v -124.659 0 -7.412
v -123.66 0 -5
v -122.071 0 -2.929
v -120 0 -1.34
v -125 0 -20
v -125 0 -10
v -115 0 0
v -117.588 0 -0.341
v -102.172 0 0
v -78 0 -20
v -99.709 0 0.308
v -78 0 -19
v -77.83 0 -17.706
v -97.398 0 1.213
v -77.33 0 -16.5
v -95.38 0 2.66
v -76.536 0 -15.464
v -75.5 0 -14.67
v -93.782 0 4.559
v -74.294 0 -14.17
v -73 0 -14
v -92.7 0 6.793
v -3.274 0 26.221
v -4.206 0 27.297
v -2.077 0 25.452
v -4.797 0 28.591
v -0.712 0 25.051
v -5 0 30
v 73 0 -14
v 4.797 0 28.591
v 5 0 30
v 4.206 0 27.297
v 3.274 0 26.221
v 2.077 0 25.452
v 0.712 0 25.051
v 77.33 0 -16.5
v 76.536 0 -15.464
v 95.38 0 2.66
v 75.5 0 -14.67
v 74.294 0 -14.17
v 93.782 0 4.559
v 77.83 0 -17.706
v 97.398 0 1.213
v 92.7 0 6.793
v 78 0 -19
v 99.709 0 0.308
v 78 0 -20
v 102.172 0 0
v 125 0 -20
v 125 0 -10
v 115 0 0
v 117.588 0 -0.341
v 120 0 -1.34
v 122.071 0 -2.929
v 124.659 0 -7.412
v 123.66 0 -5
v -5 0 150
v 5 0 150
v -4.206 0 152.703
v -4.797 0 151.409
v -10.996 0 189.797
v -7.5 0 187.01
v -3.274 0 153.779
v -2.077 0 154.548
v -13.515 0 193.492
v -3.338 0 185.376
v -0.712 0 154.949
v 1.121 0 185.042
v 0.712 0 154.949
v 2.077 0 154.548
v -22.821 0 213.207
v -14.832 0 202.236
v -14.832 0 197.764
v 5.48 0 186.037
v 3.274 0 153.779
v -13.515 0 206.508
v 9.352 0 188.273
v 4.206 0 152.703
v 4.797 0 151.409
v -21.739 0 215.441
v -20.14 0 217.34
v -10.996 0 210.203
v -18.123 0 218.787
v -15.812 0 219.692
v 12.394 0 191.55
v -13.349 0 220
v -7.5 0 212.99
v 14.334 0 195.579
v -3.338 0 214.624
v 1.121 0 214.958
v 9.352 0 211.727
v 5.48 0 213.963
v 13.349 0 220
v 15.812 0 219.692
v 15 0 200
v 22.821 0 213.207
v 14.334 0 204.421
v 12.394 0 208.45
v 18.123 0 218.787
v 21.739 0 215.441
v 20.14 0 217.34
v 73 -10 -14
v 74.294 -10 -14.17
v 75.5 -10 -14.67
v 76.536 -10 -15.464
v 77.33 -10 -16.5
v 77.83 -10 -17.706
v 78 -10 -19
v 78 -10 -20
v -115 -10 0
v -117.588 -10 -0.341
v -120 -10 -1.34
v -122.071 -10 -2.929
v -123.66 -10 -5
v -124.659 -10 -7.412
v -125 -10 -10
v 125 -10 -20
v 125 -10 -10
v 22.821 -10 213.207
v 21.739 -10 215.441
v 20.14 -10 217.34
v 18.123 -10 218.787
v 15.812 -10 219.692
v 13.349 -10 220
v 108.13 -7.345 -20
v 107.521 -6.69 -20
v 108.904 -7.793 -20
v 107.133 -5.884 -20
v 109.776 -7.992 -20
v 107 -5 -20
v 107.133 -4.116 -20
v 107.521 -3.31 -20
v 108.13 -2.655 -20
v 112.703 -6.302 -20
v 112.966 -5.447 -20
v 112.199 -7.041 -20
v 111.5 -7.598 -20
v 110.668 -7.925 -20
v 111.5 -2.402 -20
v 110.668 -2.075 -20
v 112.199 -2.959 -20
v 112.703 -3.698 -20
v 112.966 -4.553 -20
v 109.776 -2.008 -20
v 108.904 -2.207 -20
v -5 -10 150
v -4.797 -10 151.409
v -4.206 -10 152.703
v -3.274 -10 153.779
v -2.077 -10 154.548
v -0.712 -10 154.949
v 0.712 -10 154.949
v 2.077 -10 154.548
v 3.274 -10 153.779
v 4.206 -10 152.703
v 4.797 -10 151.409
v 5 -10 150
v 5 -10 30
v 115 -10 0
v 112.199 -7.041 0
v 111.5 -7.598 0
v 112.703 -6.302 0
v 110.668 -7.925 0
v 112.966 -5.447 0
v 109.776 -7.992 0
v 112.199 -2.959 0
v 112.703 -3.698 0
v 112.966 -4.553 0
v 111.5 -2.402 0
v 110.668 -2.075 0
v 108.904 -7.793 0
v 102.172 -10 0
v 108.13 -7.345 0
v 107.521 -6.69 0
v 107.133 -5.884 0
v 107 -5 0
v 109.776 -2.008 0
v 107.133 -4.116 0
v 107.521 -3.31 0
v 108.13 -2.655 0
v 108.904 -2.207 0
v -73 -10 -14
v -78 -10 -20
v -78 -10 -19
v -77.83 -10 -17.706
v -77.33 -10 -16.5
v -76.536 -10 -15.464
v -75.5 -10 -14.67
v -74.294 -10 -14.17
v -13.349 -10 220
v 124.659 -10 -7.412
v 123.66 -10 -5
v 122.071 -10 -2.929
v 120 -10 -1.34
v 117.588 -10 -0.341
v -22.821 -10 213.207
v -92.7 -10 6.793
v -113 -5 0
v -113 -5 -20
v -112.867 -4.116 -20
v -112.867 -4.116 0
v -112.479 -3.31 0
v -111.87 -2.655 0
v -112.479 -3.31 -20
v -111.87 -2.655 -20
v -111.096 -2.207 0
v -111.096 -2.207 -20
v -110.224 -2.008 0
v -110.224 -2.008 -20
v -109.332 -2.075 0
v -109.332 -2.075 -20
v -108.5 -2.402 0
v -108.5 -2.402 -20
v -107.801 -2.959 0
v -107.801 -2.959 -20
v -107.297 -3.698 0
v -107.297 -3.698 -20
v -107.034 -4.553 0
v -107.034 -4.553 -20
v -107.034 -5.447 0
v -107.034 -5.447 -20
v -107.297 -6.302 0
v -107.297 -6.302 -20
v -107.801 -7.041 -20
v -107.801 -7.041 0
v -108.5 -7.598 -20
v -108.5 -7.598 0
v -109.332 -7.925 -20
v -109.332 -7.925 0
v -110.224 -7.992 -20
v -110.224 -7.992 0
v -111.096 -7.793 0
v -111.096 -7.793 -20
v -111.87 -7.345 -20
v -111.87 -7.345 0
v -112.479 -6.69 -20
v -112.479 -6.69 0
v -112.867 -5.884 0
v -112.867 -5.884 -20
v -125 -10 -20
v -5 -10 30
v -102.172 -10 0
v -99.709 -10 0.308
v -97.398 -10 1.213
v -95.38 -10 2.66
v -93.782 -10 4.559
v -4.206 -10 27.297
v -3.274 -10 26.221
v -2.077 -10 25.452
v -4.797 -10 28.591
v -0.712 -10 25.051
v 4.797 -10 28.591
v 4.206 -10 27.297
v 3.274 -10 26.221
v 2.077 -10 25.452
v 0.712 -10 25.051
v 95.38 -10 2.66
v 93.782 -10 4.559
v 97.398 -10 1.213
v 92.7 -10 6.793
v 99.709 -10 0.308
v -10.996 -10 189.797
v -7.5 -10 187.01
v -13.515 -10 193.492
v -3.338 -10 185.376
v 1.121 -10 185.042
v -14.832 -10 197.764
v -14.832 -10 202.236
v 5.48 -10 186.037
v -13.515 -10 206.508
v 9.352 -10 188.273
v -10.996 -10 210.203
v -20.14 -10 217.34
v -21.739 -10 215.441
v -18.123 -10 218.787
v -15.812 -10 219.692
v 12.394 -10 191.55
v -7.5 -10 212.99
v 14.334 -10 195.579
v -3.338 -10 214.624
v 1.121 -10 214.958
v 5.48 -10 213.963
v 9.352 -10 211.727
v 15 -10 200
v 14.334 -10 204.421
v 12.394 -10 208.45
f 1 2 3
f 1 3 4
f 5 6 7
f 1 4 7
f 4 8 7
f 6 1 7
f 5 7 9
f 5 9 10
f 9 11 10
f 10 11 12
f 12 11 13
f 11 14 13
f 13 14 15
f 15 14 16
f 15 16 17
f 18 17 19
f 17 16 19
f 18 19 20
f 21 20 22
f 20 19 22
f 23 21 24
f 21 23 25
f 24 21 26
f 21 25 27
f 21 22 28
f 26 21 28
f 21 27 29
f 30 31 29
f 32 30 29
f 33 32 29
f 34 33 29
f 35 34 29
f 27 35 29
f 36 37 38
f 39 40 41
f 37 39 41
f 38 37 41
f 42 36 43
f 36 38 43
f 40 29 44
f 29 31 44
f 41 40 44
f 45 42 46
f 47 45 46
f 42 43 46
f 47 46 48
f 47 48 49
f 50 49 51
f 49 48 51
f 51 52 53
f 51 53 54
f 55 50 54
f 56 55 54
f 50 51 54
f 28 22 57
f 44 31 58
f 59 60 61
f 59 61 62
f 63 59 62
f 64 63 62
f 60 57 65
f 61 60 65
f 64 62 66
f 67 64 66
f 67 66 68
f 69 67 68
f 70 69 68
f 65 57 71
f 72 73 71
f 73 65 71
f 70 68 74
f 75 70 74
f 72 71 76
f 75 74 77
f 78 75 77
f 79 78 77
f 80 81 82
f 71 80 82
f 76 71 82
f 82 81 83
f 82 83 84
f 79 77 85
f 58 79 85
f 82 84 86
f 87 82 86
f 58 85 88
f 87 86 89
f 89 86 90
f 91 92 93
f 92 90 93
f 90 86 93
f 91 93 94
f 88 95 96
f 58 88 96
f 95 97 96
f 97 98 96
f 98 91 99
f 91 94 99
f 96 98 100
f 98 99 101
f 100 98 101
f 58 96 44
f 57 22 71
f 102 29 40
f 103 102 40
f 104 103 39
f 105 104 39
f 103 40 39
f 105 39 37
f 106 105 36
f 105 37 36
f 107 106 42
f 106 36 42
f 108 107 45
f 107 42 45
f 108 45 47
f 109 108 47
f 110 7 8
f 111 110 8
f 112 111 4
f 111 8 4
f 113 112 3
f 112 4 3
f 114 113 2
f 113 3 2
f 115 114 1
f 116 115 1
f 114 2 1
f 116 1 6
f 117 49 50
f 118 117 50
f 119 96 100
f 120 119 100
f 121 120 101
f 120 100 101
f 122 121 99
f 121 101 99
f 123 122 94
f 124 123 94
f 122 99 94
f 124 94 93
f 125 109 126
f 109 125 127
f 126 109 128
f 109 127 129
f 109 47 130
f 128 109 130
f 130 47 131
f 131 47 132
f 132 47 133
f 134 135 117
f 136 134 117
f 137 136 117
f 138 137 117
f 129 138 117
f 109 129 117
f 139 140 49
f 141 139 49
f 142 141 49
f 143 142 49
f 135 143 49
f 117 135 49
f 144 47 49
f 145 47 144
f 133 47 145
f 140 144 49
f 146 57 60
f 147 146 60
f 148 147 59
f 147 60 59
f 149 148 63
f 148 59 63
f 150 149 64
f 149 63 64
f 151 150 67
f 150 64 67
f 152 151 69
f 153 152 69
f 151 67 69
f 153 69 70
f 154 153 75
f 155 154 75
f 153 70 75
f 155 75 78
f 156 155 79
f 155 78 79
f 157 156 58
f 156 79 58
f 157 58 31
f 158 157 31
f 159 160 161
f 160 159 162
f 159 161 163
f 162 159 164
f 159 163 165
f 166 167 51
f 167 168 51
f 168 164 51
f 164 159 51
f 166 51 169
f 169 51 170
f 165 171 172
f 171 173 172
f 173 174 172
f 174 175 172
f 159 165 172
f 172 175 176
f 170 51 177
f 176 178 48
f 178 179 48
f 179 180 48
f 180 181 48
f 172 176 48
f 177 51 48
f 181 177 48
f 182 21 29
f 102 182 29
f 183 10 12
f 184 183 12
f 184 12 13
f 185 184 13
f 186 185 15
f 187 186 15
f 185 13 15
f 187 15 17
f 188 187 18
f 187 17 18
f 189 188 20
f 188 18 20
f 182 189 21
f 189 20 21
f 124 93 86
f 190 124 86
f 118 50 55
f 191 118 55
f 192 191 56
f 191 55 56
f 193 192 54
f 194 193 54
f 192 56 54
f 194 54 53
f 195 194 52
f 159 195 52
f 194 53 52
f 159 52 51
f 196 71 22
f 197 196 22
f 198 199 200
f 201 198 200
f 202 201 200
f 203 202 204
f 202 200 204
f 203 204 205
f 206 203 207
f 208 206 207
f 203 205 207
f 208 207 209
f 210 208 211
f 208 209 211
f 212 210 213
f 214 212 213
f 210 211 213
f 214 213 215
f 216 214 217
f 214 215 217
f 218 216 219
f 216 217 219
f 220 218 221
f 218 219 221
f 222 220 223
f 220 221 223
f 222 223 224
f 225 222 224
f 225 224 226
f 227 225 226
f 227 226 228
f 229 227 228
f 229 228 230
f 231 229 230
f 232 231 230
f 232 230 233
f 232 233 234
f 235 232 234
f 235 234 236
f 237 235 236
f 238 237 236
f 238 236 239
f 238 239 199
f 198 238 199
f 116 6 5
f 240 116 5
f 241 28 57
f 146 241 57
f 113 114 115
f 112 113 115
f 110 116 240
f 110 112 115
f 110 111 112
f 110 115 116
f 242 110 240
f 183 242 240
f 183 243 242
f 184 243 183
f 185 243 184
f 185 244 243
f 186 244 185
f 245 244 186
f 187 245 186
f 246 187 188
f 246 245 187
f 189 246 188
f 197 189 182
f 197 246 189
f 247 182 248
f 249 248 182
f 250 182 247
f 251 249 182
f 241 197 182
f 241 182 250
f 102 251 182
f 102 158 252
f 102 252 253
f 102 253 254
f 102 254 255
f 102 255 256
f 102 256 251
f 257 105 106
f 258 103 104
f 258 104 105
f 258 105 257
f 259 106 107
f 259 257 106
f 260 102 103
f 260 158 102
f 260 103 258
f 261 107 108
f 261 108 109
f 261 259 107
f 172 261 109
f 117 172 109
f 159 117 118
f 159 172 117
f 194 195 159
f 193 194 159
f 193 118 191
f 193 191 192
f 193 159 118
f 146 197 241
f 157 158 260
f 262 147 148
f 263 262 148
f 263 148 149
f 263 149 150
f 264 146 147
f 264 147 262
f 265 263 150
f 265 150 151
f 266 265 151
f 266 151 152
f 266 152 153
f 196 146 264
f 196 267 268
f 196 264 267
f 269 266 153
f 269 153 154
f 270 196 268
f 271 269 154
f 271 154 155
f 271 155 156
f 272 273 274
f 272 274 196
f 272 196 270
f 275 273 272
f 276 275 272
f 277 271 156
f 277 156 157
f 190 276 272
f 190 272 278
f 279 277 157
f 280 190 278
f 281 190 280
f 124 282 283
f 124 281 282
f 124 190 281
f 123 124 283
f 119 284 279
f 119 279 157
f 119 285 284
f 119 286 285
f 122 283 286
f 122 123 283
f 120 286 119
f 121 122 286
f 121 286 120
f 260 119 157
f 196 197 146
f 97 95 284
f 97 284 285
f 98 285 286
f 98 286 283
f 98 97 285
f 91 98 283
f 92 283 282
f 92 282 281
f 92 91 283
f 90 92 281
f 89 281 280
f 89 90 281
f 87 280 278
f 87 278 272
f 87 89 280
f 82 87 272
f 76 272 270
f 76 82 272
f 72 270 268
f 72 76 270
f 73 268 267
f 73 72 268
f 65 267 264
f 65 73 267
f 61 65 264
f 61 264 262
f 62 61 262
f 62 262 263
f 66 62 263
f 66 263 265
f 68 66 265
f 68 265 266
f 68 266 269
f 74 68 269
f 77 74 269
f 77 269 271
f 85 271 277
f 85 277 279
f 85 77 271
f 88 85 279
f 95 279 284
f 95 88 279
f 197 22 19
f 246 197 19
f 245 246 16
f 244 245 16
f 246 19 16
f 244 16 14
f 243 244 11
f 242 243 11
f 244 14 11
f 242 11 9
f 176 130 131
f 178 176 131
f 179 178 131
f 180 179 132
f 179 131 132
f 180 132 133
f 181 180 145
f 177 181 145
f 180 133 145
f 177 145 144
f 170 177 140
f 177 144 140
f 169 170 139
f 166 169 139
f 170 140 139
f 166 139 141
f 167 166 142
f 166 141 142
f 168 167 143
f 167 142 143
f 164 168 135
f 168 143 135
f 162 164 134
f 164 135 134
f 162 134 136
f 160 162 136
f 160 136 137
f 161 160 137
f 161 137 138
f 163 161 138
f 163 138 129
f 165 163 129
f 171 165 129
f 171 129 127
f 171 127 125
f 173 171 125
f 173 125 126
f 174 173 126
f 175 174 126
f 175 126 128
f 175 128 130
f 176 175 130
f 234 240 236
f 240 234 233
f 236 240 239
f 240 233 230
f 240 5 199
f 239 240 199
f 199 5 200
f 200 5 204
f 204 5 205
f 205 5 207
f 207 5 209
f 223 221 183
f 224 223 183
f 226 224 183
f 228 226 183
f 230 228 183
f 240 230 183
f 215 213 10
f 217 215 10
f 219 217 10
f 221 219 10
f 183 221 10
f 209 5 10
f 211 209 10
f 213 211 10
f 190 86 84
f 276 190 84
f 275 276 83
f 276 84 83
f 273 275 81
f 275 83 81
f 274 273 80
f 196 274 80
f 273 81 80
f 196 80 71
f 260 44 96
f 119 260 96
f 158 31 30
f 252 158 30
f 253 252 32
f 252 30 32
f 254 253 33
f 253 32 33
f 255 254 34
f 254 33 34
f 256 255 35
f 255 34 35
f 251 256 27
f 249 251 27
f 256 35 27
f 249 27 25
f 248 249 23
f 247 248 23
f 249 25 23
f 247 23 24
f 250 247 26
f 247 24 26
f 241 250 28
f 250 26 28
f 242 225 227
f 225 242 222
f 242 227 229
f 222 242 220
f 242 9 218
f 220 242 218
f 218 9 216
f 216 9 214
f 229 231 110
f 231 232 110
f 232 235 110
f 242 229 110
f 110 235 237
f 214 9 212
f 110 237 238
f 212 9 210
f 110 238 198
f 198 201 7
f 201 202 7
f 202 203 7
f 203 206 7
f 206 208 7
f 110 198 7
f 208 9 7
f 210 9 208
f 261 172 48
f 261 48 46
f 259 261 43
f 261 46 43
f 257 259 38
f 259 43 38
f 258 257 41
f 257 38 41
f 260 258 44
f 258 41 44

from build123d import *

# Parameters (mm, degrees)
F0_R     = 15
F1_DEPTH = 10
F3_D     = 6


# Not quite as in the source:
# - a feature names something its author has since deleted; it is built from what else it names


with BuildPart() as f1:
    # F0 (on Front) → F1 (new body)
    with BuildSketch(Plane.XZ):
        with BuildLine():
            Line((-125, -10), (-125, -20))
            Line((-125, -20), (-78, -20))
            Line((-78, -20), (-78, -19))
            ThreePointArc((-78, -19), (-76.5355339059, -15.4644660941), (-73, -14))
            Line((-73, -14), (73, -14))
            ThreePointArc((73, -14), (76.5355339059, -15.4644660941), (78, -19))
            Line((78, -19), (78, -20))
            Line((78, -20), (125, -20))
            Line((125, -20), (125, -10))
            ThreePointArc((125, -10), (122.0710678119, -2.9289321881), (115, 0))
            Line((115, 0), (102.1720946881, 0))
            ThreePointArc((102.1720946881, 0), (96.3439915213, 1.8739177043), (92.7001654958, 6.7933573047))
            Line((92.7001654958, 6.7933573047), (22.8206678375, 213.2066426953))
            ThreePointArc((22.8206678375, 213.2066426953), (19.176841812, 218.1260822957), (13.3487386452, 220))
            Line((13.3487386452, 220), (0, 220))
            Line((0, 220), (-13.3487386452, 220))
            ThreePointArc((-13.3487386452, 220), (-19.176841812, 218.1260822957), (-22.8206678375, 213.2066426953))
            Line((-22.8206678375, 213.2066426953), (-92.7001654958, 6.7933573047))
            ThreePointArc((-92.7001654958, 6.7933573047), (-96.3439915213, 1.8739177043), (-102.1720946881, 0))
            Line((-102.1720946881, 0), (-115, 0))
            ThreePointArc((-115, 0), (-122.0710678119, -2.9289321881), (-125, -10))
        make_face()
        with BuildLine():
            ThreePointArc((5, 30), (0, 25), (-5, 30))
            Line((-5, 30), (-5, 150))
            ThreePointArc((-5, 150), (0, 155), (5, 150))
            Line((5, 150), (5, 30))
        make_face(mode=Mode.SUBTRACT)
        with Locations((0, 200)):
            Circle(F0_R, mode=Mode.SUBTRACT)
    extrude(amount=F1_DEPTH)

    # F3 (through all)
    with Locations(Plane.XY):
        with Locations((-110, -5), (110, -5)):
            Hole(F3_D / 2)


solid = f1.part
